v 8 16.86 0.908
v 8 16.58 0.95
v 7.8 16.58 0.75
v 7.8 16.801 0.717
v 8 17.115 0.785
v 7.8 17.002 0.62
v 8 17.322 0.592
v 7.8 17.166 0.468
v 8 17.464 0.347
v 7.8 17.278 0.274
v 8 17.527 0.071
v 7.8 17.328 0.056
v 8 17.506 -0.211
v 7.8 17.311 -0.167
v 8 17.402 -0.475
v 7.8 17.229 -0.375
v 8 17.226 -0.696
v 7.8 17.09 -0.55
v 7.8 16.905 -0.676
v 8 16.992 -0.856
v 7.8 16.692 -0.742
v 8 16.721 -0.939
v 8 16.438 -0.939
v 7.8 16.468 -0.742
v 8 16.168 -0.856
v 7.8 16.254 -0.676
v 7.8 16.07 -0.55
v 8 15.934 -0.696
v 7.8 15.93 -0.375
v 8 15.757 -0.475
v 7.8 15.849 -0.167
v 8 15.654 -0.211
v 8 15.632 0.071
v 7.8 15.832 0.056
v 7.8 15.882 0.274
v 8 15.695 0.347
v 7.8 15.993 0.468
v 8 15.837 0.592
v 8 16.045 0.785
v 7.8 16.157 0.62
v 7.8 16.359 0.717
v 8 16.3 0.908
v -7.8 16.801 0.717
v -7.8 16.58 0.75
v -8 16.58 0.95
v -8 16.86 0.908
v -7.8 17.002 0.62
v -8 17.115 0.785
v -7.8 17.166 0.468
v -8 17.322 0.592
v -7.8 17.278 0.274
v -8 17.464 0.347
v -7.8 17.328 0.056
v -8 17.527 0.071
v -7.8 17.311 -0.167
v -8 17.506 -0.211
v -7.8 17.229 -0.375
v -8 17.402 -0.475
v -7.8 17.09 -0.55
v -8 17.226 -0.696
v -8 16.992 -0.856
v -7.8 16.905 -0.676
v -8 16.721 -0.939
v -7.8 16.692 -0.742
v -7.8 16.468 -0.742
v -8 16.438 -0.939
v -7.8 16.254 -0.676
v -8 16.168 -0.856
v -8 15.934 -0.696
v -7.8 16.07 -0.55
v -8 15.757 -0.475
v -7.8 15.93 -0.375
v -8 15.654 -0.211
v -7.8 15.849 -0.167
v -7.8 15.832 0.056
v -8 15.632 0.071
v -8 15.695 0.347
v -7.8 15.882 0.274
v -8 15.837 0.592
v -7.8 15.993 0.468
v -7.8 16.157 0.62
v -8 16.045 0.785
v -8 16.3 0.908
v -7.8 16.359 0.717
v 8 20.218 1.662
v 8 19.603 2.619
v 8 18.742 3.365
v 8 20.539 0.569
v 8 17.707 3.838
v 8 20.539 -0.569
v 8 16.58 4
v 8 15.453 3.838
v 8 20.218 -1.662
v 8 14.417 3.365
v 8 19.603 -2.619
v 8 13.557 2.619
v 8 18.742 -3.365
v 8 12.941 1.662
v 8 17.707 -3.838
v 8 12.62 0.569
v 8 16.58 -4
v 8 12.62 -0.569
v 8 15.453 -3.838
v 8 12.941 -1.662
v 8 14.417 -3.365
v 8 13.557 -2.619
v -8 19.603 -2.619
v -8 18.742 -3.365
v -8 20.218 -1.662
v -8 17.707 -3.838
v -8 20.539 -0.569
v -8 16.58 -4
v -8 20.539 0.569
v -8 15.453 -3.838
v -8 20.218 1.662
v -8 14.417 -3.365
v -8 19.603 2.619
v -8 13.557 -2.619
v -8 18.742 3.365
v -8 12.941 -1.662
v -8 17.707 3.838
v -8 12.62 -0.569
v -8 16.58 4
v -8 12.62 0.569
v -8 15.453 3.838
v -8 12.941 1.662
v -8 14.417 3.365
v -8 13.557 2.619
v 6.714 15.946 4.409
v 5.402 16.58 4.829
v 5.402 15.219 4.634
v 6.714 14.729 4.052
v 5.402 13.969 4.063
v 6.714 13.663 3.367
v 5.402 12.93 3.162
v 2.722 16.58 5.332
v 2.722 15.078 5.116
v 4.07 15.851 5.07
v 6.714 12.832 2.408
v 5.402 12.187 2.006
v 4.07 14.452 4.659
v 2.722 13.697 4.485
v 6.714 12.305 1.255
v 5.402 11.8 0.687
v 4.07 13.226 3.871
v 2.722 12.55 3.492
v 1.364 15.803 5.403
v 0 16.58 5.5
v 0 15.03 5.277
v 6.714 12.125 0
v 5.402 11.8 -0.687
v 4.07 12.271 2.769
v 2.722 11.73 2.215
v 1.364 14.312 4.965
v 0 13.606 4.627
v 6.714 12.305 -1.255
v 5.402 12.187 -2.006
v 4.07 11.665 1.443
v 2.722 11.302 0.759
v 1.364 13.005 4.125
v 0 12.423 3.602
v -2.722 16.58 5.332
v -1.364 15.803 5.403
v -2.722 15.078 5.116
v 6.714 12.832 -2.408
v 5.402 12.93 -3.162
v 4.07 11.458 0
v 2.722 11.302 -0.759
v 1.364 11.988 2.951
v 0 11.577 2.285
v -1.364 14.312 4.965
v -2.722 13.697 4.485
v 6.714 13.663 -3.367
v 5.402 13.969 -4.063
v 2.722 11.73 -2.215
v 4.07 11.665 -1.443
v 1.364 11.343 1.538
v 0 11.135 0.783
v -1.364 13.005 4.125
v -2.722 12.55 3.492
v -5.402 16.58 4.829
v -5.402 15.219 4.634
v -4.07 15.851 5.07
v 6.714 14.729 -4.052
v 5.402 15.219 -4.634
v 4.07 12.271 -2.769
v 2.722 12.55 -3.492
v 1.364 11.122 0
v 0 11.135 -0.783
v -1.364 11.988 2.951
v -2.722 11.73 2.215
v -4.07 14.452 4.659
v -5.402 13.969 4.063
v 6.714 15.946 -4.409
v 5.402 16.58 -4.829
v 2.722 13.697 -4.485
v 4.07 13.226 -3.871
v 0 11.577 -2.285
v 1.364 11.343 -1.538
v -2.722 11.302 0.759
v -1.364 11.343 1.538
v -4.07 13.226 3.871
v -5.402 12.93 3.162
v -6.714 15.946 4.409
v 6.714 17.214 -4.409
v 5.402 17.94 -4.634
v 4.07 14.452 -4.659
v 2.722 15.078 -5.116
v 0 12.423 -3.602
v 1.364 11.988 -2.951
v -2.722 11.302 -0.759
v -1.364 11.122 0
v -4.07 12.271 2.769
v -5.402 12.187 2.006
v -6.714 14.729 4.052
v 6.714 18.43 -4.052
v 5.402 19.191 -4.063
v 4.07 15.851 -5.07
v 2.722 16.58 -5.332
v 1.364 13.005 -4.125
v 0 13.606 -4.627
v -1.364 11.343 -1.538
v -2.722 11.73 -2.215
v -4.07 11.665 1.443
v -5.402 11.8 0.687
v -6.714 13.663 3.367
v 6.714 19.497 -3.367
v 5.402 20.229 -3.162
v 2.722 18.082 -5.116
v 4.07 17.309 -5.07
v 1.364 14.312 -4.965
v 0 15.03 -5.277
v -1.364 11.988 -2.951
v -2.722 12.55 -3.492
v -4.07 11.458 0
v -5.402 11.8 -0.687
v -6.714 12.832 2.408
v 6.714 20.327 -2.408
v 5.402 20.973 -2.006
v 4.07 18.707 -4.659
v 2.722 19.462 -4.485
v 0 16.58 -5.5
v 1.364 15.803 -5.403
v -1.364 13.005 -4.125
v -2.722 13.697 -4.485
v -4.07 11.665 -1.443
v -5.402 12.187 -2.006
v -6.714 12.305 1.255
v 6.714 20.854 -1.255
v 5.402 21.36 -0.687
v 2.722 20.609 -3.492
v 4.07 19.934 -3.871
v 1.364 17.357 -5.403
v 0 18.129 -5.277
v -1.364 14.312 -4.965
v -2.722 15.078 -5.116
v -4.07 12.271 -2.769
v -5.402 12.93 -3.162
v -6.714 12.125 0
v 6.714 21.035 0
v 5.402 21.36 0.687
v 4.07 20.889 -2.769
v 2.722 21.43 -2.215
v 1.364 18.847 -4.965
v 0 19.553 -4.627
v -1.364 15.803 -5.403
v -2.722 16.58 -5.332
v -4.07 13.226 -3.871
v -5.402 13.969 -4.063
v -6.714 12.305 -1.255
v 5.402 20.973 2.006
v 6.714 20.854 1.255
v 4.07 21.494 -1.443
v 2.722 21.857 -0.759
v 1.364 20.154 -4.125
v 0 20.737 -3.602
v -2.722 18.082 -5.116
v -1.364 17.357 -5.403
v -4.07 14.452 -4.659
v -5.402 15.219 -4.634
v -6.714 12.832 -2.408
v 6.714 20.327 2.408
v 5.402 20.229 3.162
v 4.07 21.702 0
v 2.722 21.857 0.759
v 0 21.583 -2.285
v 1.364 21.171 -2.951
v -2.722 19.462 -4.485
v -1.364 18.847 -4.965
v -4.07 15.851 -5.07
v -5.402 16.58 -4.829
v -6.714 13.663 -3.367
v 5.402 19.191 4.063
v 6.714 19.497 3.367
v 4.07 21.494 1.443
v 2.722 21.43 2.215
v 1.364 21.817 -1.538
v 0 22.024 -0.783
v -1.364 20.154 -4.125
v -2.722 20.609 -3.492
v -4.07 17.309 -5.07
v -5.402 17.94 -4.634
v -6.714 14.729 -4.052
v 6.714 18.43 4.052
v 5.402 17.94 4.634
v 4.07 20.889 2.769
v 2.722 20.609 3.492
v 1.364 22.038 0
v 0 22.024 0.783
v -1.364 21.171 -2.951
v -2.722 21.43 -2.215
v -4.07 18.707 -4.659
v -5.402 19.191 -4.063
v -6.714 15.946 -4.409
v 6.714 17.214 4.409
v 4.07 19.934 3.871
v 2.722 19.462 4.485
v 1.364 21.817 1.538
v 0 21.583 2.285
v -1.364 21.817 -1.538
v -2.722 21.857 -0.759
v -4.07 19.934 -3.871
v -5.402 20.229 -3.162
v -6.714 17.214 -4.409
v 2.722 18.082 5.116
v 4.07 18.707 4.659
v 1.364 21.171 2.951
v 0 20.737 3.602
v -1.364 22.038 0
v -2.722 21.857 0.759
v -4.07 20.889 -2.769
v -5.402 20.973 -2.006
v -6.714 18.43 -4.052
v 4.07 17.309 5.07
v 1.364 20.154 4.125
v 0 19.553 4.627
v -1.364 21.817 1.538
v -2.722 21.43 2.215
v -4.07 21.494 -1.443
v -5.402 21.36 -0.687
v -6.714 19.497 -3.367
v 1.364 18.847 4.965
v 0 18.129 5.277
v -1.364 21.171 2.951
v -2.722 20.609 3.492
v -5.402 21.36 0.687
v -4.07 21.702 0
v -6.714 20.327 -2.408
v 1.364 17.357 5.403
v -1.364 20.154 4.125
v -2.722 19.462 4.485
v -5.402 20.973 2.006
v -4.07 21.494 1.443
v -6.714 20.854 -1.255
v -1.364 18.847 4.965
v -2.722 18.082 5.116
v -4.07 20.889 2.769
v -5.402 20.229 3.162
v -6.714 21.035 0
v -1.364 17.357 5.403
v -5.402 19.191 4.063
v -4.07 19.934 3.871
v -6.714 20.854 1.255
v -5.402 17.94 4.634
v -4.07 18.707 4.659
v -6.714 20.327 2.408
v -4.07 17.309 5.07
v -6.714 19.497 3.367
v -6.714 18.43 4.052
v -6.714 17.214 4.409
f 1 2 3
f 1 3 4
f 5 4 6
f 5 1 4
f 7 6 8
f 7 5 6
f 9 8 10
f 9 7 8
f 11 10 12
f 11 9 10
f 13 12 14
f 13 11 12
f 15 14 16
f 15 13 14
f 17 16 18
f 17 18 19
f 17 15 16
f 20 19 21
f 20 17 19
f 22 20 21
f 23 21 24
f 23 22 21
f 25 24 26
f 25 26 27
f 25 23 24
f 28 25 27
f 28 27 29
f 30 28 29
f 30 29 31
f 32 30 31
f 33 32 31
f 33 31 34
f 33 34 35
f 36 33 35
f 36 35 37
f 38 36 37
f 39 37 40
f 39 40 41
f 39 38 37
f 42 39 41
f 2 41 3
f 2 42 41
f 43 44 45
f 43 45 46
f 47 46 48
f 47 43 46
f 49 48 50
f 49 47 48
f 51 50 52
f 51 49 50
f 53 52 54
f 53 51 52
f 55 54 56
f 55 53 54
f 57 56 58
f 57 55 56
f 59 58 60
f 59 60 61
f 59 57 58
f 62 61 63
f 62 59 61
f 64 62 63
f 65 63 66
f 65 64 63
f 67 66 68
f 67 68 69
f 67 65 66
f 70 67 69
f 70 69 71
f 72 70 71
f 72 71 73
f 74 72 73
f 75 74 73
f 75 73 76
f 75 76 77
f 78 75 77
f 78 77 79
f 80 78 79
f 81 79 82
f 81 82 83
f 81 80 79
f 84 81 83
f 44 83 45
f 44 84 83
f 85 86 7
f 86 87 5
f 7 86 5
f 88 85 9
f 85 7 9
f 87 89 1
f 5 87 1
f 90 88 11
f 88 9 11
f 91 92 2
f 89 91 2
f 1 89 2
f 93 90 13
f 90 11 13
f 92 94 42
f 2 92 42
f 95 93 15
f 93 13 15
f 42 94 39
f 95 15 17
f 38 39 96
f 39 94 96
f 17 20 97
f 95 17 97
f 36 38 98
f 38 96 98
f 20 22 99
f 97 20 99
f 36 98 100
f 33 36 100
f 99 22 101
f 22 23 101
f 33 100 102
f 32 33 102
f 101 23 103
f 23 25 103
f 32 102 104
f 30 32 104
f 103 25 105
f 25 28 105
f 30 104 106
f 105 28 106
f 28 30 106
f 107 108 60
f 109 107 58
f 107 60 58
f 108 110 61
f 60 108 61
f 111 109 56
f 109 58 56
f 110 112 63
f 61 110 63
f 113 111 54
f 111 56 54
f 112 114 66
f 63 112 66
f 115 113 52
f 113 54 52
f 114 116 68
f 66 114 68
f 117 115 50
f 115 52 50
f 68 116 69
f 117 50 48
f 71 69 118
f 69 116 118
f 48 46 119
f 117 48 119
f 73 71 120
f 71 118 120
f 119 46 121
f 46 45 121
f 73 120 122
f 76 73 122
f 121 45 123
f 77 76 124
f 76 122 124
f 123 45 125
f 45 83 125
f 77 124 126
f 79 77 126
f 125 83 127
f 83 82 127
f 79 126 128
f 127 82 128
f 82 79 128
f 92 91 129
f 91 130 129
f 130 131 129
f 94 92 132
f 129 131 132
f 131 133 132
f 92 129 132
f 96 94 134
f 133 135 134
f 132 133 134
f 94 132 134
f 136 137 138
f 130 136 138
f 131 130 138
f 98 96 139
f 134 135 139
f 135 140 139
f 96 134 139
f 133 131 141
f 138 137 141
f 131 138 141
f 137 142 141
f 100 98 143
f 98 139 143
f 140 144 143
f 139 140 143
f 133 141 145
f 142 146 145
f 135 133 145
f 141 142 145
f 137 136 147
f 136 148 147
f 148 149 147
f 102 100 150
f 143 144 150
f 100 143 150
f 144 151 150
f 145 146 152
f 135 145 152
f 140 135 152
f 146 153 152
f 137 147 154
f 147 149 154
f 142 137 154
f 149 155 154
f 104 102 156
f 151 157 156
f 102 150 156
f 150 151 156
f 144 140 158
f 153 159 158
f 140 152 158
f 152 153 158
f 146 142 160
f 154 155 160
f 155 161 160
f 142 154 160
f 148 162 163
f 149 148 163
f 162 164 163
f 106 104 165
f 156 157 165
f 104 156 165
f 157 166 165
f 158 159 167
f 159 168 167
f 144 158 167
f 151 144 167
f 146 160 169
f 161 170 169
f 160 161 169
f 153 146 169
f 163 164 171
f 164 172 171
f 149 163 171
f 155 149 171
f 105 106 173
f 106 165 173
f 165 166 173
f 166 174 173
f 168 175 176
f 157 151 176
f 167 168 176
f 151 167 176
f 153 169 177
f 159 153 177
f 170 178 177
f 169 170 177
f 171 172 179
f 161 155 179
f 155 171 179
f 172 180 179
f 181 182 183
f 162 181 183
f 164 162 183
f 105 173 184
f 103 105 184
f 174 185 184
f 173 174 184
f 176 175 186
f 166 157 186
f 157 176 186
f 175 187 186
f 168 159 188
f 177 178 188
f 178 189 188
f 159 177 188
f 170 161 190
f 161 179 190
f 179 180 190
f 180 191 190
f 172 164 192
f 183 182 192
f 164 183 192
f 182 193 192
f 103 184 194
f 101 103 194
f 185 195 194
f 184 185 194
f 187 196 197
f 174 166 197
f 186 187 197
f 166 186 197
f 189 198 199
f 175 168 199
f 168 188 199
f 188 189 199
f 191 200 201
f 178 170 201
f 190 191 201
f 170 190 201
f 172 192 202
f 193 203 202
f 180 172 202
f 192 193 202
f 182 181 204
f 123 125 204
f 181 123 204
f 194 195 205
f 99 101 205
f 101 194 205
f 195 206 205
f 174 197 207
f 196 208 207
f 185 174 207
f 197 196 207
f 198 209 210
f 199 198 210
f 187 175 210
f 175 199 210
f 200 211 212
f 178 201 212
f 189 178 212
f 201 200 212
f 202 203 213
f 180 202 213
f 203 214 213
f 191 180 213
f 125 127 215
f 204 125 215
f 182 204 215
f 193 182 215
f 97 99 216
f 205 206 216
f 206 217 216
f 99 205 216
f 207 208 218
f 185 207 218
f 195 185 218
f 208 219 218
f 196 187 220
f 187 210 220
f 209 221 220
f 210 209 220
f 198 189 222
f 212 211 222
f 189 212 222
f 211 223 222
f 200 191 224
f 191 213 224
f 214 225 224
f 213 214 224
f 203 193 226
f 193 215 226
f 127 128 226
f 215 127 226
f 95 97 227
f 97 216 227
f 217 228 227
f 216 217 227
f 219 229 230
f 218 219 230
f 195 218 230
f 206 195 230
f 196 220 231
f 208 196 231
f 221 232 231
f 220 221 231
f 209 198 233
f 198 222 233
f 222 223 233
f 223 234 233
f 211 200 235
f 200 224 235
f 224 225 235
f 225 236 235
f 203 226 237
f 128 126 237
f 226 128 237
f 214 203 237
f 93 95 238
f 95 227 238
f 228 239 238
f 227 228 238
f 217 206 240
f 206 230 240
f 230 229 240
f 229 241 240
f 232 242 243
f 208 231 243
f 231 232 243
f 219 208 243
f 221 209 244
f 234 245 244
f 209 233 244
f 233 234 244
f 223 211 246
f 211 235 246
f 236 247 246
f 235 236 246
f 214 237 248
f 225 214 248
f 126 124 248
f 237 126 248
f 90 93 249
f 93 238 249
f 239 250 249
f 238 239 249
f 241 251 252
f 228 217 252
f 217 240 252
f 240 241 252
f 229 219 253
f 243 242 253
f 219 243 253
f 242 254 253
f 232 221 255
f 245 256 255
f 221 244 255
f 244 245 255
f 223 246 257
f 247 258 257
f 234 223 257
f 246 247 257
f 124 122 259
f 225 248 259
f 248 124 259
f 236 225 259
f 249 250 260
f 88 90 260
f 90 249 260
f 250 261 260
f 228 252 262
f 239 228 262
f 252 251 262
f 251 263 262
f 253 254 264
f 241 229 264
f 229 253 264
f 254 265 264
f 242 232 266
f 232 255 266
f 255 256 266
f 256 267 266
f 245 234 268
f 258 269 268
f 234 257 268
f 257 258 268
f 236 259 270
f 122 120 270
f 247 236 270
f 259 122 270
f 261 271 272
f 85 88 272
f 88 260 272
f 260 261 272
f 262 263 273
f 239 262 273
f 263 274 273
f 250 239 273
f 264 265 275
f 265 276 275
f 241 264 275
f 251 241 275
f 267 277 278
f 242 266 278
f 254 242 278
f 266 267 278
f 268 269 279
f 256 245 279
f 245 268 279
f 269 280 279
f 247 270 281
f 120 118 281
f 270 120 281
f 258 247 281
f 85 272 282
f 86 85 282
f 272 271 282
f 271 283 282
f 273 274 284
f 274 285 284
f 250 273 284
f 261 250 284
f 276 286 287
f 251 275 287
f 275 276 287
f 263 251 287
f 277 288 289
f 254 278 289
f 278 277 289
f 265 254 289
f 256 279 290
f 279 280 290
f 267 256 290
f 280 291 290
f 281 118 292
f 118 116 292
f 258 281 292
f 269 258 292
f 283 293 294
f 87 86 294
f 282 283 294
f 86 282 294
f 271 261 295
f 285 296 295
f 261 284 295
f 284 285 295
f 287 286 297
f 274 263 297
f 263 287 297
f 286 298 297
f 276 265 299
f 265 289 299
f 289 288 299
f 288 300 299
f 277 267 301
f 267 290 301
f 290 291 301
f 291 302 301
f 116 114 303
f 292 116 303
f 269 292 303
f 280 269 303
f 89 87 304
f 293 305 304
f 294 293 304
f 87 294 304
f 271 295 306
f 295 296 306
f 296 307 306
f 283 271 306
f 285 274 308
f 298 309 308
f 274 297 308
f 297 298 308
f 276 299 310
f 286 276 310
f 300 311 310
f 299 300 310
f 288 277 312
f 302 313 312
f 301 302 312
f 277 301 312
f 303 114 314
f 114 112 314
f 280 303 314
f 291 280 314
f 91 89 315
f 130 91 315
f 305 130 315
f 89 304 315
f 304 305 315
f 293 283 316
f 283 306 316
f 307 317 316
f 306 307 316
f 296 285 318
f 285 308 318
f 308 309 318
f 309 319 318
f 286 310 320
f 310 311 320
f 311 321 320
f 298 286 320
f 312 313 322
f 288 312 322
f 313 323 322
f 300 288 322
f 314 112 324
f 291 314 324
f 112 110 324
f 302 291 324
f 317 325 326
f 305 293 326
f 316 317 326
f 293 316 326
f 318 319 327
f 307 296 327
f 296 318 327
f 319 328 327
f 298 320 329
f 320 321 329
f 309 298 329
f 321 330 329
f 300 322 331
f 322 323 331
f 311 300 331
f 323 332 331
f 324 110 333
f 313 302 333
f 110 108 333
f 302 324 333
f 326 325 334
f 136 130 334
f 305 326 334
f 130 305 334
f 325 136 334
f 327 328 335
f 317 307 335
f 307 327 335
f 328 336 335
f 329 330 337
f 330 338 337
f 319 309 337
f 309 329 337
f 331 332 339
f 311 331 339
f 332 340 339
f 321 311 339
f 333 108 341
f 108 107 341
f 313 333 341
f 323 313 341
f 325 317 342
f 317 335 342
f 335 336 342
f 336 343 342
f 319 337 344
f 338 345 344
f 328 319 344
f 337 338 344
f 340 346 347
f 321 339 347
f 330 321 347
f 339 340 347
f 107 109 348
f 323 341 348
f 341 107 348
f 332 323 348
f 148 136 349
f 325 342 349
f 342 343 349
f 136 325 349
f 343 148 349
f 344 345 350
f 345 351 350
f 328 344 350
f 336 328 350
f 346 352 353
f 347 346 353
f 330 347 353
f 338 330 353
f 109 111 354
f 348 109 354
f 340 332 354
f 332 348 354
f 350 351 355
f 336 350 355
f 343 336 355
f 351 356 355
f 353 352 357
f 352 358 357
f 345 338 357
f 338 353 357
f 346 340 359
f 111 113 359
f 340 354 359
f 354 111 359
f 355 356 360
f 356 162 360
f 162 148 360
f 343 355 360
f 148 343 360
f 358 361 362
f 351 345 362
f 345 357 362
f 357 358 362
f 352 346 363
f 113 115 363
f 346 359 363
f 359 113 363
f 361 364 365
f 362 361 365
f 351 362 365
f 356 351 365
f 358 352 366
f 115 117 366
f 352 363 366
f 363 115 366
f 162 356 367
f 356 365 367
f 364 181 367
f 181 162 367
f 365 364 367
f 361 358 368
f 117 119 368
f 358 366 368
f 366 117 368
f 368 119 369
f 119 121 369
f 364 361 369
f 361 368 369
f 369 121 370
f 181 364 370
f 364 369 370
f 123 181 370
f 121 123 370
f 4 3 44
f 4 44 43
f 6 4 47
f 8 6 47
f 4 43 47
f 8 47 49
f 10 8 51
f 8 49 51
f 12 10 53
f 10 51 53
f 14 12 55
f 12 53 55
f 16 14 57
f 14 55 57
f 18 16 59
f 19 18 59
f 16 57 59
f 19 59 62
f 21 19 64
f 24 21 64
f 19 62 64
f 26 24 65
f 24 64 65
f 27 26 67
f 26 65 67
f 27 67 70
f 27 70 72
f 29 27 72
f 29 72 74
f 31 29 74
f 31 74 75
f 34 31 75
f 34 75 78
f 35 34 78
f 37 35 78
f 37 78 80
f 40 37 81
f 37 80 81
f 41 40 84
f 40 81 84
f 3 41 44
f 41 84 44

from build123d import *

# Parameters (mm, degrees)
CROQUIS2_R            = 0.75
CORTAR_EXTRUIR1_DEPTH = 16
CHAFL_N1_SIZE         = 0.2


with BuildPart() as part:
    # Croquis1 → Revolución1 (revolve)
    with BuildSketch(Plane.XY, mode=Mode.PRIVATE) as revoluci_n1_sk:
        with BuildLine():
            Line((-8, 20.579757044), (-8, 16.579757044))
            Line((-8, 16.579757044), (8, 16.579757044))
            Line((8, 16.579757044), (8, 20.579757044))
            ThreePointArc((8, 20.579757044), (0, 22.08), (-8, 20.579757044))
        make_face()
    revolve(revoluci_n1_sk.sketch.rotate(Axis((-8, 16.579757044, 0), (1, 0, 0)), 90), axis=Axis((-8, 16.579757044, 0), (1, 0, 0)))

    # Croquis2 → Cortar-Extruir1 (cut)
    with BuildSketch(Plane.ZY.offset(8)):
        with Locations((0, 16.579757044)):
            Circle(CROQUIS2_R)
    extrude(amount=-CORTAR_EXTRUIR1_DEPTH, mode=Mode.SUBTRACT)

    # Chaflán1
    chafl_n1_edges = [part.edges().sort_by_distance(p)[0] for p in [
        (-8, 16.579757044, -0.75),
        (8, 16.579757044, -0.75),
    ]]
    chamfer(chafl_n1_edges, length=CHAFL_N1_SIZE)


solid = part.part
